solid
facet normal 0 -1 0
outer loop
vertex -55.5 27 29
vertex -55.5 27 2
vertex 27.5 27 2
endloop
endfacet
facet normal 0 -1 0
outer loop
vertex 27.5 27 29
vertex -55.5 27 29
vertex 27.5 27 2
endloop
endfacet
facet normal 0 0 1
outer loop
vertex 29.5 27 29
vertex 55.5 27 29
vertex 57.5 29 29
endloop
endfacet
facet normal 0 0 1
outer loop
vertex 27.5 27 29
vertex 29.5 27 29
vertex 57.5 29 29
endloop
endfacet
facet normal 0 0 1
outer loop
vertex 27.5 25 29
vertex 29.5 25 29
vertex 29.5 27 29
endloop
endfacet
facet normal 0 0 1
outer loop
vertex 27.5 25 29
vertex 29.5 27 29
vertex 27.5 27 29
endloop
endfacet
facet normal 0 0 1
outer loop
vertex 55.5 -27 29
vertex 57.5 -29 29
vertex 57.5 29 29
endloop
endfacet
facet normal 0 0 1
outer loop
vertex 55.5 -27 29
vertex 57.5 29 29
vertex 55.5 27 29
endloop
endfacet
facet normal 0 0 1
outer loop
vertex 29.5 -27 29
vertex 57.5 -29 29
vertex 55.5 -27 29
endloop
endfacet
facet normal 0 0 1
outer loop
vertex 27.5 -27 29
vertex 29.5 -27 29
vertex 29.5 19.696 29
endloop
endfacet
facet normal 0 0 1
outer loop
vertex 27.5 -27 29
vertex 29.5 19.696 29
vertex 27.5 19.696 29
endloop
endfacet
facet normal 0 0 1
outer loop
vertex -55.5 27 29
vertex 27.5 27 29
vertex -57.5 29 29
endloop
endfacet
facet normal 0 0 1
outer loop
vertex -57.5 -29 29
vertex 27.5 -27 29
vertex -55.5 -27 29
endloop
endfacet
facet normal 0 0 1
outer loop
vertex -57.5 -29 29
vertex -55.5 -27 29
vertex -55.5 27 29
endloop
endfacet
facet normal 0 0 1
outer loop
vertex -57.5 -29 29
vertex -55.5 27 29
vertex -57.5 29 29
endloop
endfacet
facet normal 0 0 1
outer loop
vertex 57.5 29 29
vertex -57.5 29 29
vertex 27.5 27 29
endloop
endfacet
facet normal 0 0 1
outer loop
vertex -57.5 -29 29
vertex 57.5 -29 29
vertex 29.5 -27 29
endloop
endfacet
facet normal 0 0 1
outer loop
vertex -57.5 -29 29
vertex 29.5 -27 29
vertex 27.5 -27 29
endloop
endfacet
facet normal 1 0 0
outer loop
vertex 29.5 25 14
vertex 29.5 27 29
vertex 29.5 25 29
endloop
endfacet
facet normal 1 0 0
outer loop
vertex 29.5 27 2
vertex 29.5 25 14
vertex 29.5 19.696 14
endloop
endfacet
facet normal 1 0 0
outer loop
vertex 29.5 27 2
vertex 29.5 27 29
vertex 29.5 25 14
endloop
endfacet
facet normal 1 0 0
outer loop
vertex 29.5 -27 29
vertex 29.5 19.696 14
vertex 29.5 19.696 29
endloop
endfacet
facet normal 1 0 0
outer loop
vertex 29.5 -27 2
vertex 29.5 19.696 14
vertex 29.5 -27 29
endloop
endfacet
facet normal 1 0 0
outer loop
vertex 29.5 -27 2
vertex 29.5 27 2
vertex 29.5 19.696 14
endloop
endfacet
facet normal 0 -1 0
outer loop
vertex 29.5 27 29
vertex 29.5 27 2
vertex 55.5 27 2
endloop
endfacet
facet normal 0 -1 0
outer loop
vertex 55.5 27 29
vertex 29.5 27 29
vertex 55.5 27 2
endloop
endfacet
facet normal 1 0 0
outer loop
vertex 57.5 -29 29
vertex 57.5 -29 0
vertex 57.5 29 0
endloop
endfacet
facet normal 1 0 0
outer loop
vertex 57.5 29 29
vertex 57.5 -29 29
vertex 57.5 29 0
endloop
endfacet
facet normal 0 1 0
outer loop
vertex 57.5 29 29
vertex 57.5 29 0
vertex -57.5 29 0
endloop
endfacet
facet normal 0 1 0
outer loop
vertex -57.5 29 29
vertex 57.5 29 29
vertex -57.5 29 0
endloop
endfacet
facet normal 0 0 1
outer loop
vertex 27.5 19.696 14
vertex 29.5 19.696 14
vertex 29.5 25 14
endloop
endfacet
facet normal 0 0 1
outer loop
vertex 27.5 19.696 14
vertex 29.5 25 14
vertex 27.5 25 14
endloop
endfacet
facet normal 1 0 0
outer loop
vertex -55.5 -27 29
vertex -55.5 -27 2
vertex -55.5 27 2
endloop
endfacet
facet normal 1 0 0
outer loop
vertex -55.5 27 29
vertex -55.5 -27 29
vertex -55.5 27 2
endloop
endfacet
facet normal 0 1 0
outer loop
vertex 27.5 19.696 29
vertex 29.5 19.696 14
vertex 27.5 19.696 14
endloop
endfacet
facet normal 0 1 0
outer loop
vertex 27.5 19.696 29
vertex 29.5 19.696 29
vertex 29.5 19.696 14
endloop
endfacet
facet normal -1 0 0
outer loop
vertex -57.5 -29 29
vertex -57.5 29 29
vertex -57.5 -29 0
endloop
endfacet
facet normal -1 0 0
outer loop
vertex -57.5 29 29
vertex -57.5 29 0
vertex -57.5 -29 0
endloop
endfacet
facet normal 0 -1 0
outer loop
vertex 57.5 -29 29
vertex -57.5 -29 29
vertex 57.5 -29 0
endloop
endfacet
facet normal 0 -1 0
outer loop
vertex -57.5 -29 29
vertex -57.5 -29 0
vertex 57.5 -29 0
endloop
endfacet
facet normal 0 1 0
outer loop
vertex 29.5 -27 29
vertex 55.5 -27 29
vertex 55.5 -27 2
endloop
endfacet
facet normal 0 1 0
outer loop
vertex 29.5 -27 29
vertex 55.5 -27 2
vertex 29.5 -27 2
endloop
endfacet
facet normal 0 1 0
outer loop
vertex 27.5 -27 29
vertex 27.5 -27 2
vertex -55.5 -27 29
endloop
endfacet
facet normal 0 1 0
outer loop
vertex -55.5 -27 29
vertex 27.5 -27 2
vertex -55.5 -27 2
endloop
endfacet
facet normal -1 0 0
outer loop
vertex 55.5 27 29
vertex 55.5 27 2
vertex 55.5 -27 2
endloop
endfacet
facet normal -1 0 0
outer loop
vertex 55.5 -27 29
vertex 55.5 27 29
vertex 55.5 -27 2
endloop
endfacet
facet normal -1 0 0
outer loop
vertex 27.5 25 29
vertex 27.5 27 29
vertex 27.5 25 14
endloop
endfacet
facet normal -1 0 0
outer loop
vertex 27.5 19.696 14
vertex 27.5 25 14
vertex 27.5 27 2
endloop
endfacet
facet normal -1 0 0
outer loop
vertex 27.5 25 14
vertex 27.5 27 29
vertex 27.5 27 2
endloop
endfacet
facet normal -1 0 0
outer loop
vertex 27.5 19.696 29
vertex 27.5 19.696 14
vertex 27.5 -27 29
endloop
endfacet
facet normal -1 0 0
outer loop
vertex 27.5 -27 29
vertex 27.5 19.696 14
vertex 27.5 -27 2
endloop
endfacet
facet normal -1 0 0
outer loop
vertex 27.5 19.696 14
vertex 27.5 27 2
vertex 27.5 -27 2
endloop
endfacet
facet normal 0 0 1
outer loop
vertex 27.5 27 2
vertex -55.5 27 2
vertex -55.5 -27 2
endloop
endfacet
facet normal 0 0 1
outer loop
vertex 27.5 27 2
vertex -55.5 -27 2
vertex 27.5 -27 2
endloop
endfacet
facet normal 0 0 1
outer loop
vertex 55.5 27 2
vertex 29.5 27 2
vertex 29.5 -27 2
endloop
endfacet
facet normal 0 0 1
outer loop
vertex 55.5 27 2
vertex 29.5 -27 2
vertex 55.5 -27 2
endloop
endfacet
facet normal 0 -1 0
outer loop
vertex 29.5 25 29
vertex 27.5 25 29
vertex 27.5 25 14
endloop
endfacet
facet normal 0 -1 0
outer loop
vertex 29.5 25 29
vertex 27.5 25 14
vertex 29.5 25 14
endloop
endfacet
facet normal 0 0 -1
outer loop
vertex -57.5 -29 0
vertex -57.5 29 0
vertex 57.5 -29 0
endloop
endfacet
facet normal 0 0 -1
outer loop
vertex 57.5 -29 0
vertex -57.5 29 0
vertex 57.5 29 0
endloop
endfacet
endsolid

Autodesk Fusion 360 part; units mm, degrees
sketch "Sketch1" plane through (0, 0, 0) normal (0, 0, 1) x (1, 0, 0)
  line L0 (57.5, -29) -> (-57.5, -29)
  line L1 (-57.5, -29) -> (-57.5, 29)
  line L2 (-57.5, 29) -> (57.5, 29)
  line L3 (57.5, 29) -> (57.5, -29)
  line L4 (57.5, -29) -> (-57.5, 29) construction
  line L5 (-57.5, -29) -> (57.5, 29) construction
  line L6 (55.5, -27) -> (-55.5, -27)
  line L7 (-55.5, -27) -> (-55.5, 27)
  line L8 (-55.5, 27) -> (55.5, 27)
  line L9 (55.5, 27) -> (55.5, -27)
  line L10 (55.5, -27) -> (-55.5, 27) construction
  line L11 (-55.5, -27) -> (55.5, 27) construction
extrude "Extrude1" add sketch "Sketch1" along normal blind 2 contours L0 L1 L2 L3 | L6 L7 L8 L9
sketch "Sketch2" plane through (0, 0, 2) normal (0, 0, 1) x (-1, 0, 0)
  line L0 (-57.5, -29) -> (57.5, -29)
  line L1 (57.5, -29) -> (57.5, 29)
  line L2 (57.5, 29) -> (-57.5, 29)
  line L3 (-57.5, 29) -> (-57.5, -29)
  line L4 (-57.5, 29) -> (57.5, 29)
  line L5 (57.5, 29) -> (57.5, -29)
  line L6 (57.5, -29) -> (-57.5, -29)
  line L7 (-57.5, -29) -> (-57.5, 29)
  line L8 (-57.5, 29) -> (57.5, -29) construction
  line L9 (57.5, 29) -> (-57.5, -29) construction
  line L10 (-55.5, 27) -> (55.5, 27)
  line L11 (55.5, 27) -> (55.5, -27)
  line L12 (55.5, -27) -> (-55.5, -27)
  line L13 (-55.5, -27) -> (-55.5, 27)
  line L14 (-55.5, 27) -> (55.5, -27) construction
  line L15 (55.5, 27) -> (-55.5, -27) construction
extrude "Extrude2" add sketch "Sketch2" along normal blind 27
sketch "Sketch3" plane through (0, 0, 2) normal (0, 0, 1) x (-1, 0, 0)
  line L0 (55.5, -27) -> (55.5, 27)
  line L1 (55.5, 27) -> (-55.5, 27)
  line L2 (-55.5, 27) -> (-55.5, -27)
  line L3 (-55.5, -27) -> (55.5, -27)
  line L4 (-55.5, -27) -> (-29.5, -27)
  line L5 (-29.5, -27) -> (-29.5, 27)
  line L6 (-29.5, 27) -> (-55.5, 27)
  line L7 (-55.5, 27) -> (-55.5, -27)
  line L8 (-29.5, -27) -> (-27.5, -27)
  line L9 (-27.5, -27) -> (-27.5, 27)
  line L10 (-27.5, 27) -> (-29.5, 27)
  line L11 (-29.5, 27) -> (-29.5, -27)
extrude "Extrude3" add sketch "Sketch3" along normal blind 27 contours L1 L3 L5 L8 L9 L10 L11
sketch "Sketch4" plane through (0, 0, 29) normal (0, 0, 1) x (-1, 0, 0)
  line L0 (-27.5, 27) -> (55.5, 27)
  line L1 (55.5, 27) -> (55.5, -27)
  line L2 (55.5, -27) -> (-27.5, -27)
  line L3 (-27.5, -27) -> (-27.5, 27)
  line L4 (-29.5, 27) -> (-29.5, -27)
  line L5 (-29.5, -27) -> (-55.5, -27)
  line L6 (-55.5, -27) -> (-55.5, 27)
  line L7 (-55.5, 27) -> (-29.5, 27)
  line L8 (-57.5, -29) -> (57.5, -29)
  line L9 (57.5, -29) -> (57.5, 29)
  line L10 (57.5, 29) -> (-57.5, 29)
  line L11 (-57.5, 29) -> (-57.5, -29)
  line L12 (-25, -25) -> (-32.1654, -25)
  line L13 (-32.1654, -25) -> (-32.1654, -19.6955)
  line L14 (-32.1654, -19.6955) -> (-25, -19.6955)
  line L15 (-25, -19.6955) -> (-25, -25)
extrude "Extrude4" cut sketch "Sketch4" against normal blind 15 contours L3 L12 L14 L15 | L3 L4 L12 L14 | L4 L12 L13 L14
